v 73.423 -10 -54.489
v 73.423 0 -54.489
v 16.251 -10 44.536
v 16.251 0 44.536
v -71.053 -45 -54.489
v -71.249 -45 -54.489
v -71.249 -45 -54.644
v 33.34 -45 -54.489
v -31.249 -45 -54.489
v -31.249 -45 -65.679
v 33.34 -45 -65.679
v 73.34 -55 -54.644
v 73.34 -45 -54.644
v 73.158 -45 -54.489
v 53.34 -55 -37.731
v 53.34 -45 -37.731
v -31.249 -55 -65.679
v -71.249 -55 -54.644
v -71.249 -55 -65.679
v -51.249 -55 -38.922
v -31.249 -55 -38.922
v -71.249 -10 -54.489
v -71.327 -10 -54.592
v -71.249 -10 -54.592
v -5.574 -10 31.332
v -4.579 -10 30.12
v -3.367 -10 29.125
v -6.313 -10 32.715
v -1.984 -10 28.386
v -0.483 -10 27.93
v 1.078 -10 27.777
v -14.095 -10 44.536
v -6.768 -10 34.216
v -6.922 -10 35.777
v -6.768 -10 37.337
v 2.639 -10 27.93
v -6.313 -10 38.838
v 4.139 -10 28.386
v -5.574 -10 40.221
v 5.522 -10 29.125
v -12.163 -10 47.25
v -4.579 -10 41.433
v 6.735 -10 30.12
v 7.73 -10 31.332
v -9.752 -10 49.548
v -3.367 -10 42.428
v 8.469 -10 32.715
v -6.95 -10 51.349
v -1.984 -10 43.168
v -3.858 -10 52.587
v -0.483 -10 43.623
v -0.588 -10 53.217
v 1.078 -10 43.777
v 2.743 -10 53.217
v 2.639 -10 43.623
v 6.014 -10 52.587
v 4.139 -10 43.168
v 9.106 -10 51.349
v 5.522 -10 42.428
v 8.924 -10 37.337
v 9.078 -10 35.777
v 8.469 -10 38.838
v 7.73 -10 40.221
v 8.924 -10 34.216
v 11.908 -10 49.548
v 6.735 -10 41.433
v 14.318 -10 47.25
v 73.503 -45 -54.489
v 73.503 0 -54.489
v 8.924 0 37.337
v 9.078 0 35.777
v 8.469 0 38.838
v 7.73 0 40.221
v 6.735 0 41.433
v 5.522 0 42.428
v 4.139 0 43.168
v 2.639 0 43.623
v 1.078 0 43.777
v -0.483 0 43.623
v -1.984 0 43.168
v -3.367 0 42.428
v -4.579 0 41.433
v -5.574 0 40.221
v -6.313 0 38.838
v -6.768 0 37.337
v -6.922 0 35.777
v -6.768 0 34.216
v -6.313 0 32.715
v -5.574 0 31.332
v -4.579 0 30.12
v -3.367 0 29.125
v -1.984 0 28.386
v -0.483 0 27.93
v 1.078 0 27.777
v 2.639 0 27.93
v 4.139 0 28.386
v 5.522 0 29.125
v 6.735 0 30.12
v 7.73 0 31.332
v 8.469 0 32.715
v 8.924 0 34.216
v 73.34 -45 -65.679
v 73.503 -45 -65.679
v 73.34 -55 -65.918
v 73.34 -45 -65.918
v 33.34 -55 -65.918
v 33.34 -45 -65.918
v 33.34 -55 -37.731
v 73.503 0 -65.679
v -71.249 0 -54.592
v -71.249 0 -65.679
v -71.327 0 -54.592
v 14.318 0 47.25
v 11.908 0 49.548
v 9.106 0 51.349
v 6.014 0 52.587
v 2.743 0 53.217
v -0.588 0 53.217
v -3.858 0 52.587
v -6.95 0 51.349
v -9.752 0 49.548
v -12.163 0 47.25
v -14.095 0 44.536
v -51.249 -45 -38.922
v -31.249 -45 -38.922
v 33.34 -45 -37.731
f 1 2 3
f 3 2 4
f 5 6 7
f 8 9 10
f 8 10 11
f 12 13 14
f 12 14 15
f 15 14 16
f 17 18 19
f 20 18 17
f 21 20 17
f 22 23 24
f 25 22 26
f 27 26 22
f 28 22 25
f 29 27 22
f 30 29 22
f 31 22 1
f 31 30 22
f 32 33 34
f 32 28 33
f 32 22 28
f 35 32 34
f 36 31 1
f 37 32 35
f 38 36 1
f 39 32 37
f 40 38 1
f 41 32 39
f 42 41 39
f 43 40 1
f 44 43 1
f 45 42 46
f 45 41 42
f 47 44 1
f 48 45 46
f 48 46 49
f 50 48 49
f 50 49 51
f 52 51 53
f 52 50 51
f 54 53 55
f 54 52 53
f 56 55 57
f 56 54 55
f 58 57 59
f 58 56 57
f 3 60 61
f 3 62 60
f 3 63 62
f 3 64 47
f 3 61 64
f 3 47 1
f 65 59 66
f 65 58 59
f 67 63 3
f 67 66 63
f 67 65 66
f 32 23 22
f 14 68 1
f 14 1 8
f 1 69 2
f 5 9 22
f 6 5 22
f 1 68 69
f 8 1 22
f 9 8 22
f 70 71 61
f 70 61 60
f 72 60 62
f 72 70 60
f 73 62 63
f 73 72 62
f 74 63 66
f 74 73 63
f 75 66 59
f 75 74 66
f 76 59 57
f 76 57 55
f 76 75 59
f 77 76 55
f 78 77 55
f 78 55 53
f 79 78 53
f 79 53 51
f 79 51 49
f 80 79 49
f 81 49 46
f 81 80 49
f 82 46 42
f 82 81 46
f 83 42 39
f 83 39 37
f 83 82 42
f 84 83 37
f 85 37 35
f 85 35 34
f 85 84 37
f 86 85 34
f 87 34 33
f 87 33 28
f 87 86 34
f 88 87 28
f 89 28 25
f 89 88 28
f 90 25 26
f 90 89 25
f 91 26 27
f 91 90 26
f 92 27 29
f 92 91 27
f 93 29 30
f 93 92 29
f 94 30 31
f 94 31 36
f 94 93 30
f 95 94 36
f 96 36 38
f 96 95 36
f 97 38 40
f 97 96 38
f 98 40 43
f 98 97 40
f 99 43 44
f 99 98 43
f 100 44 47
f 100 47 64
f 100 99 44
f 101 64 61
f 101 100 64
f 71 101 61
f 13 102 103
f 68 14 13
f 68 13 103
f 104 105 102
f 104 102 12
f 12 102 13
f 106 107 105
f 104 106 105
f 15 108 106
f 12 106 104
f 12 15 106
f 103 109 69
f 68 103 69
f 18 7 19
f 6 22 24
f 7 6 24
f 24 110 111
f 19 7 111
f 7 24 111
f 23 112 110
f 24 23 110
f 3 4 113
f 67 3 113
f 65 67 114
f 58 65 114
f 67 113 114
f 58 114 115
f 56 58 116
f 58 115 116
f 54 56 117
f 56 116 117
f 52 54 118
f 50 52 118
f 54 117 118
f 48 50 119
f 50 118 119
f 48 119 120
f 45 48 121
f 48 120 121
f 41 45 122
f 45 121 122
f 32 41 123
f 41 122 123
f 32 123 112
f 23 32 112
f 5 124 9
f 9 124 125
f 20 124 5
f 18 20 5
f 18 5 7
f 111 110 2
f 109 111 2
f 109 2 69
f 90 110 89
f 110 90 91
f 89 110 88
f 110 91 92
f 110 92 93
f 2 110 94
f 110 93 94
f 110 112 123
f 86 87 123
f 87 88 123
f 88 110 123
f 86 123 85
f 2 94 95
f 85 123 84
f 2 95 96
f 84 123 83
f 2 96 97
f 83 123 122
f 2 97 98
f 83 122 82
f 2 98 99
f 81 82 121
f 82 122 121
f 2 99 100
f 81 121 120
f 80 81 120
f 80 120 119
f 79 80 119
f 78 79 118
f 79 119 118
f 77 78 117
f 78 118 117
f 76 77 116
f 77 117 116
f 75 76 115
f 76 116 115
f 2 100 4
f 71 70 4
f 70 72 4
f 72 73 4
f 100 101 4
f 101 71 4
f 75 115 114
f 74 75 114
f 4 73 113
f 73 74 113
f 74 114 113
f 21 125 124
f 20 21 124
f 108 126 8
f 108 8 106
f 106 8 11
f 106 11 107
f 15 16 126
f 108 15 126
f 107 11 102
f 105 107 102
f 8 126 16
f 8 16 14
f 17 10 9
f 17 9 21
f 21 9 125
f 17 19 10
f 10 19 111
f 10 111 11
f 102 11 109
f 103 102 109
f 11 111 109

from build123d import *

# Parameters (mm, degrees)
F0_R     = 8
F2_DEPTH = 10
F3_DEPTH = 45
F5_DEPTH = 10


with BuildPart() as f2:
    # F0 (on Front) → F2 (new body)
    with BuildSketch(Plane.XZ):
        with BuildLine():
            Line((-14.09482, 44.536495), (-71.326971, -54.5925))
            Line((-71.326971, -54.5925), (73.482672, -54.5925))
            Line((73.482672, -54.5925), (16.25052, 44.536495))
            ThreePointArc((16.25052, 44.536495), (1.07785, 53.29644), (-14.09482, 44.536495))
        make_face()
        with Locations((1.07785, 35.77655)):
            Circle(F0_R, mode=Mode.SUBTRACT)
    extrude(amount=F2_DEPTH)

    # F1 (on Front) → F3 (join)
    with BuildSketch(Plane.XZ):
        Polygon((73.503241, -54.489337), (-71.249463, -54.489337), (-71.249463, -61.854444), (-71.249463, -65.678634), (73.503241, -65.678634), (73.503241, -61.854444), align=None)
    extrude(amount=F3_DEPTH)

    # F4 (on face) → F5 (join)
    with BuildSketch(Plane.XZ.offset(45)):
        Polygon((-71.249463, -54.64355), (-71.249463, -65.678634), (-31.249463, -65.678634), (-31.249463, -38.922109), (-51.249463, -38.922109), align=None)
        Polygon((33.34011, -65.918161), (73.34011, -65.918161), (73.34011, -54.64355), (53.34011, -37.731093), (33.34011, -37.731093), align=None)
    extrude(amount=F5_DEPTH)


solid = f2.part
